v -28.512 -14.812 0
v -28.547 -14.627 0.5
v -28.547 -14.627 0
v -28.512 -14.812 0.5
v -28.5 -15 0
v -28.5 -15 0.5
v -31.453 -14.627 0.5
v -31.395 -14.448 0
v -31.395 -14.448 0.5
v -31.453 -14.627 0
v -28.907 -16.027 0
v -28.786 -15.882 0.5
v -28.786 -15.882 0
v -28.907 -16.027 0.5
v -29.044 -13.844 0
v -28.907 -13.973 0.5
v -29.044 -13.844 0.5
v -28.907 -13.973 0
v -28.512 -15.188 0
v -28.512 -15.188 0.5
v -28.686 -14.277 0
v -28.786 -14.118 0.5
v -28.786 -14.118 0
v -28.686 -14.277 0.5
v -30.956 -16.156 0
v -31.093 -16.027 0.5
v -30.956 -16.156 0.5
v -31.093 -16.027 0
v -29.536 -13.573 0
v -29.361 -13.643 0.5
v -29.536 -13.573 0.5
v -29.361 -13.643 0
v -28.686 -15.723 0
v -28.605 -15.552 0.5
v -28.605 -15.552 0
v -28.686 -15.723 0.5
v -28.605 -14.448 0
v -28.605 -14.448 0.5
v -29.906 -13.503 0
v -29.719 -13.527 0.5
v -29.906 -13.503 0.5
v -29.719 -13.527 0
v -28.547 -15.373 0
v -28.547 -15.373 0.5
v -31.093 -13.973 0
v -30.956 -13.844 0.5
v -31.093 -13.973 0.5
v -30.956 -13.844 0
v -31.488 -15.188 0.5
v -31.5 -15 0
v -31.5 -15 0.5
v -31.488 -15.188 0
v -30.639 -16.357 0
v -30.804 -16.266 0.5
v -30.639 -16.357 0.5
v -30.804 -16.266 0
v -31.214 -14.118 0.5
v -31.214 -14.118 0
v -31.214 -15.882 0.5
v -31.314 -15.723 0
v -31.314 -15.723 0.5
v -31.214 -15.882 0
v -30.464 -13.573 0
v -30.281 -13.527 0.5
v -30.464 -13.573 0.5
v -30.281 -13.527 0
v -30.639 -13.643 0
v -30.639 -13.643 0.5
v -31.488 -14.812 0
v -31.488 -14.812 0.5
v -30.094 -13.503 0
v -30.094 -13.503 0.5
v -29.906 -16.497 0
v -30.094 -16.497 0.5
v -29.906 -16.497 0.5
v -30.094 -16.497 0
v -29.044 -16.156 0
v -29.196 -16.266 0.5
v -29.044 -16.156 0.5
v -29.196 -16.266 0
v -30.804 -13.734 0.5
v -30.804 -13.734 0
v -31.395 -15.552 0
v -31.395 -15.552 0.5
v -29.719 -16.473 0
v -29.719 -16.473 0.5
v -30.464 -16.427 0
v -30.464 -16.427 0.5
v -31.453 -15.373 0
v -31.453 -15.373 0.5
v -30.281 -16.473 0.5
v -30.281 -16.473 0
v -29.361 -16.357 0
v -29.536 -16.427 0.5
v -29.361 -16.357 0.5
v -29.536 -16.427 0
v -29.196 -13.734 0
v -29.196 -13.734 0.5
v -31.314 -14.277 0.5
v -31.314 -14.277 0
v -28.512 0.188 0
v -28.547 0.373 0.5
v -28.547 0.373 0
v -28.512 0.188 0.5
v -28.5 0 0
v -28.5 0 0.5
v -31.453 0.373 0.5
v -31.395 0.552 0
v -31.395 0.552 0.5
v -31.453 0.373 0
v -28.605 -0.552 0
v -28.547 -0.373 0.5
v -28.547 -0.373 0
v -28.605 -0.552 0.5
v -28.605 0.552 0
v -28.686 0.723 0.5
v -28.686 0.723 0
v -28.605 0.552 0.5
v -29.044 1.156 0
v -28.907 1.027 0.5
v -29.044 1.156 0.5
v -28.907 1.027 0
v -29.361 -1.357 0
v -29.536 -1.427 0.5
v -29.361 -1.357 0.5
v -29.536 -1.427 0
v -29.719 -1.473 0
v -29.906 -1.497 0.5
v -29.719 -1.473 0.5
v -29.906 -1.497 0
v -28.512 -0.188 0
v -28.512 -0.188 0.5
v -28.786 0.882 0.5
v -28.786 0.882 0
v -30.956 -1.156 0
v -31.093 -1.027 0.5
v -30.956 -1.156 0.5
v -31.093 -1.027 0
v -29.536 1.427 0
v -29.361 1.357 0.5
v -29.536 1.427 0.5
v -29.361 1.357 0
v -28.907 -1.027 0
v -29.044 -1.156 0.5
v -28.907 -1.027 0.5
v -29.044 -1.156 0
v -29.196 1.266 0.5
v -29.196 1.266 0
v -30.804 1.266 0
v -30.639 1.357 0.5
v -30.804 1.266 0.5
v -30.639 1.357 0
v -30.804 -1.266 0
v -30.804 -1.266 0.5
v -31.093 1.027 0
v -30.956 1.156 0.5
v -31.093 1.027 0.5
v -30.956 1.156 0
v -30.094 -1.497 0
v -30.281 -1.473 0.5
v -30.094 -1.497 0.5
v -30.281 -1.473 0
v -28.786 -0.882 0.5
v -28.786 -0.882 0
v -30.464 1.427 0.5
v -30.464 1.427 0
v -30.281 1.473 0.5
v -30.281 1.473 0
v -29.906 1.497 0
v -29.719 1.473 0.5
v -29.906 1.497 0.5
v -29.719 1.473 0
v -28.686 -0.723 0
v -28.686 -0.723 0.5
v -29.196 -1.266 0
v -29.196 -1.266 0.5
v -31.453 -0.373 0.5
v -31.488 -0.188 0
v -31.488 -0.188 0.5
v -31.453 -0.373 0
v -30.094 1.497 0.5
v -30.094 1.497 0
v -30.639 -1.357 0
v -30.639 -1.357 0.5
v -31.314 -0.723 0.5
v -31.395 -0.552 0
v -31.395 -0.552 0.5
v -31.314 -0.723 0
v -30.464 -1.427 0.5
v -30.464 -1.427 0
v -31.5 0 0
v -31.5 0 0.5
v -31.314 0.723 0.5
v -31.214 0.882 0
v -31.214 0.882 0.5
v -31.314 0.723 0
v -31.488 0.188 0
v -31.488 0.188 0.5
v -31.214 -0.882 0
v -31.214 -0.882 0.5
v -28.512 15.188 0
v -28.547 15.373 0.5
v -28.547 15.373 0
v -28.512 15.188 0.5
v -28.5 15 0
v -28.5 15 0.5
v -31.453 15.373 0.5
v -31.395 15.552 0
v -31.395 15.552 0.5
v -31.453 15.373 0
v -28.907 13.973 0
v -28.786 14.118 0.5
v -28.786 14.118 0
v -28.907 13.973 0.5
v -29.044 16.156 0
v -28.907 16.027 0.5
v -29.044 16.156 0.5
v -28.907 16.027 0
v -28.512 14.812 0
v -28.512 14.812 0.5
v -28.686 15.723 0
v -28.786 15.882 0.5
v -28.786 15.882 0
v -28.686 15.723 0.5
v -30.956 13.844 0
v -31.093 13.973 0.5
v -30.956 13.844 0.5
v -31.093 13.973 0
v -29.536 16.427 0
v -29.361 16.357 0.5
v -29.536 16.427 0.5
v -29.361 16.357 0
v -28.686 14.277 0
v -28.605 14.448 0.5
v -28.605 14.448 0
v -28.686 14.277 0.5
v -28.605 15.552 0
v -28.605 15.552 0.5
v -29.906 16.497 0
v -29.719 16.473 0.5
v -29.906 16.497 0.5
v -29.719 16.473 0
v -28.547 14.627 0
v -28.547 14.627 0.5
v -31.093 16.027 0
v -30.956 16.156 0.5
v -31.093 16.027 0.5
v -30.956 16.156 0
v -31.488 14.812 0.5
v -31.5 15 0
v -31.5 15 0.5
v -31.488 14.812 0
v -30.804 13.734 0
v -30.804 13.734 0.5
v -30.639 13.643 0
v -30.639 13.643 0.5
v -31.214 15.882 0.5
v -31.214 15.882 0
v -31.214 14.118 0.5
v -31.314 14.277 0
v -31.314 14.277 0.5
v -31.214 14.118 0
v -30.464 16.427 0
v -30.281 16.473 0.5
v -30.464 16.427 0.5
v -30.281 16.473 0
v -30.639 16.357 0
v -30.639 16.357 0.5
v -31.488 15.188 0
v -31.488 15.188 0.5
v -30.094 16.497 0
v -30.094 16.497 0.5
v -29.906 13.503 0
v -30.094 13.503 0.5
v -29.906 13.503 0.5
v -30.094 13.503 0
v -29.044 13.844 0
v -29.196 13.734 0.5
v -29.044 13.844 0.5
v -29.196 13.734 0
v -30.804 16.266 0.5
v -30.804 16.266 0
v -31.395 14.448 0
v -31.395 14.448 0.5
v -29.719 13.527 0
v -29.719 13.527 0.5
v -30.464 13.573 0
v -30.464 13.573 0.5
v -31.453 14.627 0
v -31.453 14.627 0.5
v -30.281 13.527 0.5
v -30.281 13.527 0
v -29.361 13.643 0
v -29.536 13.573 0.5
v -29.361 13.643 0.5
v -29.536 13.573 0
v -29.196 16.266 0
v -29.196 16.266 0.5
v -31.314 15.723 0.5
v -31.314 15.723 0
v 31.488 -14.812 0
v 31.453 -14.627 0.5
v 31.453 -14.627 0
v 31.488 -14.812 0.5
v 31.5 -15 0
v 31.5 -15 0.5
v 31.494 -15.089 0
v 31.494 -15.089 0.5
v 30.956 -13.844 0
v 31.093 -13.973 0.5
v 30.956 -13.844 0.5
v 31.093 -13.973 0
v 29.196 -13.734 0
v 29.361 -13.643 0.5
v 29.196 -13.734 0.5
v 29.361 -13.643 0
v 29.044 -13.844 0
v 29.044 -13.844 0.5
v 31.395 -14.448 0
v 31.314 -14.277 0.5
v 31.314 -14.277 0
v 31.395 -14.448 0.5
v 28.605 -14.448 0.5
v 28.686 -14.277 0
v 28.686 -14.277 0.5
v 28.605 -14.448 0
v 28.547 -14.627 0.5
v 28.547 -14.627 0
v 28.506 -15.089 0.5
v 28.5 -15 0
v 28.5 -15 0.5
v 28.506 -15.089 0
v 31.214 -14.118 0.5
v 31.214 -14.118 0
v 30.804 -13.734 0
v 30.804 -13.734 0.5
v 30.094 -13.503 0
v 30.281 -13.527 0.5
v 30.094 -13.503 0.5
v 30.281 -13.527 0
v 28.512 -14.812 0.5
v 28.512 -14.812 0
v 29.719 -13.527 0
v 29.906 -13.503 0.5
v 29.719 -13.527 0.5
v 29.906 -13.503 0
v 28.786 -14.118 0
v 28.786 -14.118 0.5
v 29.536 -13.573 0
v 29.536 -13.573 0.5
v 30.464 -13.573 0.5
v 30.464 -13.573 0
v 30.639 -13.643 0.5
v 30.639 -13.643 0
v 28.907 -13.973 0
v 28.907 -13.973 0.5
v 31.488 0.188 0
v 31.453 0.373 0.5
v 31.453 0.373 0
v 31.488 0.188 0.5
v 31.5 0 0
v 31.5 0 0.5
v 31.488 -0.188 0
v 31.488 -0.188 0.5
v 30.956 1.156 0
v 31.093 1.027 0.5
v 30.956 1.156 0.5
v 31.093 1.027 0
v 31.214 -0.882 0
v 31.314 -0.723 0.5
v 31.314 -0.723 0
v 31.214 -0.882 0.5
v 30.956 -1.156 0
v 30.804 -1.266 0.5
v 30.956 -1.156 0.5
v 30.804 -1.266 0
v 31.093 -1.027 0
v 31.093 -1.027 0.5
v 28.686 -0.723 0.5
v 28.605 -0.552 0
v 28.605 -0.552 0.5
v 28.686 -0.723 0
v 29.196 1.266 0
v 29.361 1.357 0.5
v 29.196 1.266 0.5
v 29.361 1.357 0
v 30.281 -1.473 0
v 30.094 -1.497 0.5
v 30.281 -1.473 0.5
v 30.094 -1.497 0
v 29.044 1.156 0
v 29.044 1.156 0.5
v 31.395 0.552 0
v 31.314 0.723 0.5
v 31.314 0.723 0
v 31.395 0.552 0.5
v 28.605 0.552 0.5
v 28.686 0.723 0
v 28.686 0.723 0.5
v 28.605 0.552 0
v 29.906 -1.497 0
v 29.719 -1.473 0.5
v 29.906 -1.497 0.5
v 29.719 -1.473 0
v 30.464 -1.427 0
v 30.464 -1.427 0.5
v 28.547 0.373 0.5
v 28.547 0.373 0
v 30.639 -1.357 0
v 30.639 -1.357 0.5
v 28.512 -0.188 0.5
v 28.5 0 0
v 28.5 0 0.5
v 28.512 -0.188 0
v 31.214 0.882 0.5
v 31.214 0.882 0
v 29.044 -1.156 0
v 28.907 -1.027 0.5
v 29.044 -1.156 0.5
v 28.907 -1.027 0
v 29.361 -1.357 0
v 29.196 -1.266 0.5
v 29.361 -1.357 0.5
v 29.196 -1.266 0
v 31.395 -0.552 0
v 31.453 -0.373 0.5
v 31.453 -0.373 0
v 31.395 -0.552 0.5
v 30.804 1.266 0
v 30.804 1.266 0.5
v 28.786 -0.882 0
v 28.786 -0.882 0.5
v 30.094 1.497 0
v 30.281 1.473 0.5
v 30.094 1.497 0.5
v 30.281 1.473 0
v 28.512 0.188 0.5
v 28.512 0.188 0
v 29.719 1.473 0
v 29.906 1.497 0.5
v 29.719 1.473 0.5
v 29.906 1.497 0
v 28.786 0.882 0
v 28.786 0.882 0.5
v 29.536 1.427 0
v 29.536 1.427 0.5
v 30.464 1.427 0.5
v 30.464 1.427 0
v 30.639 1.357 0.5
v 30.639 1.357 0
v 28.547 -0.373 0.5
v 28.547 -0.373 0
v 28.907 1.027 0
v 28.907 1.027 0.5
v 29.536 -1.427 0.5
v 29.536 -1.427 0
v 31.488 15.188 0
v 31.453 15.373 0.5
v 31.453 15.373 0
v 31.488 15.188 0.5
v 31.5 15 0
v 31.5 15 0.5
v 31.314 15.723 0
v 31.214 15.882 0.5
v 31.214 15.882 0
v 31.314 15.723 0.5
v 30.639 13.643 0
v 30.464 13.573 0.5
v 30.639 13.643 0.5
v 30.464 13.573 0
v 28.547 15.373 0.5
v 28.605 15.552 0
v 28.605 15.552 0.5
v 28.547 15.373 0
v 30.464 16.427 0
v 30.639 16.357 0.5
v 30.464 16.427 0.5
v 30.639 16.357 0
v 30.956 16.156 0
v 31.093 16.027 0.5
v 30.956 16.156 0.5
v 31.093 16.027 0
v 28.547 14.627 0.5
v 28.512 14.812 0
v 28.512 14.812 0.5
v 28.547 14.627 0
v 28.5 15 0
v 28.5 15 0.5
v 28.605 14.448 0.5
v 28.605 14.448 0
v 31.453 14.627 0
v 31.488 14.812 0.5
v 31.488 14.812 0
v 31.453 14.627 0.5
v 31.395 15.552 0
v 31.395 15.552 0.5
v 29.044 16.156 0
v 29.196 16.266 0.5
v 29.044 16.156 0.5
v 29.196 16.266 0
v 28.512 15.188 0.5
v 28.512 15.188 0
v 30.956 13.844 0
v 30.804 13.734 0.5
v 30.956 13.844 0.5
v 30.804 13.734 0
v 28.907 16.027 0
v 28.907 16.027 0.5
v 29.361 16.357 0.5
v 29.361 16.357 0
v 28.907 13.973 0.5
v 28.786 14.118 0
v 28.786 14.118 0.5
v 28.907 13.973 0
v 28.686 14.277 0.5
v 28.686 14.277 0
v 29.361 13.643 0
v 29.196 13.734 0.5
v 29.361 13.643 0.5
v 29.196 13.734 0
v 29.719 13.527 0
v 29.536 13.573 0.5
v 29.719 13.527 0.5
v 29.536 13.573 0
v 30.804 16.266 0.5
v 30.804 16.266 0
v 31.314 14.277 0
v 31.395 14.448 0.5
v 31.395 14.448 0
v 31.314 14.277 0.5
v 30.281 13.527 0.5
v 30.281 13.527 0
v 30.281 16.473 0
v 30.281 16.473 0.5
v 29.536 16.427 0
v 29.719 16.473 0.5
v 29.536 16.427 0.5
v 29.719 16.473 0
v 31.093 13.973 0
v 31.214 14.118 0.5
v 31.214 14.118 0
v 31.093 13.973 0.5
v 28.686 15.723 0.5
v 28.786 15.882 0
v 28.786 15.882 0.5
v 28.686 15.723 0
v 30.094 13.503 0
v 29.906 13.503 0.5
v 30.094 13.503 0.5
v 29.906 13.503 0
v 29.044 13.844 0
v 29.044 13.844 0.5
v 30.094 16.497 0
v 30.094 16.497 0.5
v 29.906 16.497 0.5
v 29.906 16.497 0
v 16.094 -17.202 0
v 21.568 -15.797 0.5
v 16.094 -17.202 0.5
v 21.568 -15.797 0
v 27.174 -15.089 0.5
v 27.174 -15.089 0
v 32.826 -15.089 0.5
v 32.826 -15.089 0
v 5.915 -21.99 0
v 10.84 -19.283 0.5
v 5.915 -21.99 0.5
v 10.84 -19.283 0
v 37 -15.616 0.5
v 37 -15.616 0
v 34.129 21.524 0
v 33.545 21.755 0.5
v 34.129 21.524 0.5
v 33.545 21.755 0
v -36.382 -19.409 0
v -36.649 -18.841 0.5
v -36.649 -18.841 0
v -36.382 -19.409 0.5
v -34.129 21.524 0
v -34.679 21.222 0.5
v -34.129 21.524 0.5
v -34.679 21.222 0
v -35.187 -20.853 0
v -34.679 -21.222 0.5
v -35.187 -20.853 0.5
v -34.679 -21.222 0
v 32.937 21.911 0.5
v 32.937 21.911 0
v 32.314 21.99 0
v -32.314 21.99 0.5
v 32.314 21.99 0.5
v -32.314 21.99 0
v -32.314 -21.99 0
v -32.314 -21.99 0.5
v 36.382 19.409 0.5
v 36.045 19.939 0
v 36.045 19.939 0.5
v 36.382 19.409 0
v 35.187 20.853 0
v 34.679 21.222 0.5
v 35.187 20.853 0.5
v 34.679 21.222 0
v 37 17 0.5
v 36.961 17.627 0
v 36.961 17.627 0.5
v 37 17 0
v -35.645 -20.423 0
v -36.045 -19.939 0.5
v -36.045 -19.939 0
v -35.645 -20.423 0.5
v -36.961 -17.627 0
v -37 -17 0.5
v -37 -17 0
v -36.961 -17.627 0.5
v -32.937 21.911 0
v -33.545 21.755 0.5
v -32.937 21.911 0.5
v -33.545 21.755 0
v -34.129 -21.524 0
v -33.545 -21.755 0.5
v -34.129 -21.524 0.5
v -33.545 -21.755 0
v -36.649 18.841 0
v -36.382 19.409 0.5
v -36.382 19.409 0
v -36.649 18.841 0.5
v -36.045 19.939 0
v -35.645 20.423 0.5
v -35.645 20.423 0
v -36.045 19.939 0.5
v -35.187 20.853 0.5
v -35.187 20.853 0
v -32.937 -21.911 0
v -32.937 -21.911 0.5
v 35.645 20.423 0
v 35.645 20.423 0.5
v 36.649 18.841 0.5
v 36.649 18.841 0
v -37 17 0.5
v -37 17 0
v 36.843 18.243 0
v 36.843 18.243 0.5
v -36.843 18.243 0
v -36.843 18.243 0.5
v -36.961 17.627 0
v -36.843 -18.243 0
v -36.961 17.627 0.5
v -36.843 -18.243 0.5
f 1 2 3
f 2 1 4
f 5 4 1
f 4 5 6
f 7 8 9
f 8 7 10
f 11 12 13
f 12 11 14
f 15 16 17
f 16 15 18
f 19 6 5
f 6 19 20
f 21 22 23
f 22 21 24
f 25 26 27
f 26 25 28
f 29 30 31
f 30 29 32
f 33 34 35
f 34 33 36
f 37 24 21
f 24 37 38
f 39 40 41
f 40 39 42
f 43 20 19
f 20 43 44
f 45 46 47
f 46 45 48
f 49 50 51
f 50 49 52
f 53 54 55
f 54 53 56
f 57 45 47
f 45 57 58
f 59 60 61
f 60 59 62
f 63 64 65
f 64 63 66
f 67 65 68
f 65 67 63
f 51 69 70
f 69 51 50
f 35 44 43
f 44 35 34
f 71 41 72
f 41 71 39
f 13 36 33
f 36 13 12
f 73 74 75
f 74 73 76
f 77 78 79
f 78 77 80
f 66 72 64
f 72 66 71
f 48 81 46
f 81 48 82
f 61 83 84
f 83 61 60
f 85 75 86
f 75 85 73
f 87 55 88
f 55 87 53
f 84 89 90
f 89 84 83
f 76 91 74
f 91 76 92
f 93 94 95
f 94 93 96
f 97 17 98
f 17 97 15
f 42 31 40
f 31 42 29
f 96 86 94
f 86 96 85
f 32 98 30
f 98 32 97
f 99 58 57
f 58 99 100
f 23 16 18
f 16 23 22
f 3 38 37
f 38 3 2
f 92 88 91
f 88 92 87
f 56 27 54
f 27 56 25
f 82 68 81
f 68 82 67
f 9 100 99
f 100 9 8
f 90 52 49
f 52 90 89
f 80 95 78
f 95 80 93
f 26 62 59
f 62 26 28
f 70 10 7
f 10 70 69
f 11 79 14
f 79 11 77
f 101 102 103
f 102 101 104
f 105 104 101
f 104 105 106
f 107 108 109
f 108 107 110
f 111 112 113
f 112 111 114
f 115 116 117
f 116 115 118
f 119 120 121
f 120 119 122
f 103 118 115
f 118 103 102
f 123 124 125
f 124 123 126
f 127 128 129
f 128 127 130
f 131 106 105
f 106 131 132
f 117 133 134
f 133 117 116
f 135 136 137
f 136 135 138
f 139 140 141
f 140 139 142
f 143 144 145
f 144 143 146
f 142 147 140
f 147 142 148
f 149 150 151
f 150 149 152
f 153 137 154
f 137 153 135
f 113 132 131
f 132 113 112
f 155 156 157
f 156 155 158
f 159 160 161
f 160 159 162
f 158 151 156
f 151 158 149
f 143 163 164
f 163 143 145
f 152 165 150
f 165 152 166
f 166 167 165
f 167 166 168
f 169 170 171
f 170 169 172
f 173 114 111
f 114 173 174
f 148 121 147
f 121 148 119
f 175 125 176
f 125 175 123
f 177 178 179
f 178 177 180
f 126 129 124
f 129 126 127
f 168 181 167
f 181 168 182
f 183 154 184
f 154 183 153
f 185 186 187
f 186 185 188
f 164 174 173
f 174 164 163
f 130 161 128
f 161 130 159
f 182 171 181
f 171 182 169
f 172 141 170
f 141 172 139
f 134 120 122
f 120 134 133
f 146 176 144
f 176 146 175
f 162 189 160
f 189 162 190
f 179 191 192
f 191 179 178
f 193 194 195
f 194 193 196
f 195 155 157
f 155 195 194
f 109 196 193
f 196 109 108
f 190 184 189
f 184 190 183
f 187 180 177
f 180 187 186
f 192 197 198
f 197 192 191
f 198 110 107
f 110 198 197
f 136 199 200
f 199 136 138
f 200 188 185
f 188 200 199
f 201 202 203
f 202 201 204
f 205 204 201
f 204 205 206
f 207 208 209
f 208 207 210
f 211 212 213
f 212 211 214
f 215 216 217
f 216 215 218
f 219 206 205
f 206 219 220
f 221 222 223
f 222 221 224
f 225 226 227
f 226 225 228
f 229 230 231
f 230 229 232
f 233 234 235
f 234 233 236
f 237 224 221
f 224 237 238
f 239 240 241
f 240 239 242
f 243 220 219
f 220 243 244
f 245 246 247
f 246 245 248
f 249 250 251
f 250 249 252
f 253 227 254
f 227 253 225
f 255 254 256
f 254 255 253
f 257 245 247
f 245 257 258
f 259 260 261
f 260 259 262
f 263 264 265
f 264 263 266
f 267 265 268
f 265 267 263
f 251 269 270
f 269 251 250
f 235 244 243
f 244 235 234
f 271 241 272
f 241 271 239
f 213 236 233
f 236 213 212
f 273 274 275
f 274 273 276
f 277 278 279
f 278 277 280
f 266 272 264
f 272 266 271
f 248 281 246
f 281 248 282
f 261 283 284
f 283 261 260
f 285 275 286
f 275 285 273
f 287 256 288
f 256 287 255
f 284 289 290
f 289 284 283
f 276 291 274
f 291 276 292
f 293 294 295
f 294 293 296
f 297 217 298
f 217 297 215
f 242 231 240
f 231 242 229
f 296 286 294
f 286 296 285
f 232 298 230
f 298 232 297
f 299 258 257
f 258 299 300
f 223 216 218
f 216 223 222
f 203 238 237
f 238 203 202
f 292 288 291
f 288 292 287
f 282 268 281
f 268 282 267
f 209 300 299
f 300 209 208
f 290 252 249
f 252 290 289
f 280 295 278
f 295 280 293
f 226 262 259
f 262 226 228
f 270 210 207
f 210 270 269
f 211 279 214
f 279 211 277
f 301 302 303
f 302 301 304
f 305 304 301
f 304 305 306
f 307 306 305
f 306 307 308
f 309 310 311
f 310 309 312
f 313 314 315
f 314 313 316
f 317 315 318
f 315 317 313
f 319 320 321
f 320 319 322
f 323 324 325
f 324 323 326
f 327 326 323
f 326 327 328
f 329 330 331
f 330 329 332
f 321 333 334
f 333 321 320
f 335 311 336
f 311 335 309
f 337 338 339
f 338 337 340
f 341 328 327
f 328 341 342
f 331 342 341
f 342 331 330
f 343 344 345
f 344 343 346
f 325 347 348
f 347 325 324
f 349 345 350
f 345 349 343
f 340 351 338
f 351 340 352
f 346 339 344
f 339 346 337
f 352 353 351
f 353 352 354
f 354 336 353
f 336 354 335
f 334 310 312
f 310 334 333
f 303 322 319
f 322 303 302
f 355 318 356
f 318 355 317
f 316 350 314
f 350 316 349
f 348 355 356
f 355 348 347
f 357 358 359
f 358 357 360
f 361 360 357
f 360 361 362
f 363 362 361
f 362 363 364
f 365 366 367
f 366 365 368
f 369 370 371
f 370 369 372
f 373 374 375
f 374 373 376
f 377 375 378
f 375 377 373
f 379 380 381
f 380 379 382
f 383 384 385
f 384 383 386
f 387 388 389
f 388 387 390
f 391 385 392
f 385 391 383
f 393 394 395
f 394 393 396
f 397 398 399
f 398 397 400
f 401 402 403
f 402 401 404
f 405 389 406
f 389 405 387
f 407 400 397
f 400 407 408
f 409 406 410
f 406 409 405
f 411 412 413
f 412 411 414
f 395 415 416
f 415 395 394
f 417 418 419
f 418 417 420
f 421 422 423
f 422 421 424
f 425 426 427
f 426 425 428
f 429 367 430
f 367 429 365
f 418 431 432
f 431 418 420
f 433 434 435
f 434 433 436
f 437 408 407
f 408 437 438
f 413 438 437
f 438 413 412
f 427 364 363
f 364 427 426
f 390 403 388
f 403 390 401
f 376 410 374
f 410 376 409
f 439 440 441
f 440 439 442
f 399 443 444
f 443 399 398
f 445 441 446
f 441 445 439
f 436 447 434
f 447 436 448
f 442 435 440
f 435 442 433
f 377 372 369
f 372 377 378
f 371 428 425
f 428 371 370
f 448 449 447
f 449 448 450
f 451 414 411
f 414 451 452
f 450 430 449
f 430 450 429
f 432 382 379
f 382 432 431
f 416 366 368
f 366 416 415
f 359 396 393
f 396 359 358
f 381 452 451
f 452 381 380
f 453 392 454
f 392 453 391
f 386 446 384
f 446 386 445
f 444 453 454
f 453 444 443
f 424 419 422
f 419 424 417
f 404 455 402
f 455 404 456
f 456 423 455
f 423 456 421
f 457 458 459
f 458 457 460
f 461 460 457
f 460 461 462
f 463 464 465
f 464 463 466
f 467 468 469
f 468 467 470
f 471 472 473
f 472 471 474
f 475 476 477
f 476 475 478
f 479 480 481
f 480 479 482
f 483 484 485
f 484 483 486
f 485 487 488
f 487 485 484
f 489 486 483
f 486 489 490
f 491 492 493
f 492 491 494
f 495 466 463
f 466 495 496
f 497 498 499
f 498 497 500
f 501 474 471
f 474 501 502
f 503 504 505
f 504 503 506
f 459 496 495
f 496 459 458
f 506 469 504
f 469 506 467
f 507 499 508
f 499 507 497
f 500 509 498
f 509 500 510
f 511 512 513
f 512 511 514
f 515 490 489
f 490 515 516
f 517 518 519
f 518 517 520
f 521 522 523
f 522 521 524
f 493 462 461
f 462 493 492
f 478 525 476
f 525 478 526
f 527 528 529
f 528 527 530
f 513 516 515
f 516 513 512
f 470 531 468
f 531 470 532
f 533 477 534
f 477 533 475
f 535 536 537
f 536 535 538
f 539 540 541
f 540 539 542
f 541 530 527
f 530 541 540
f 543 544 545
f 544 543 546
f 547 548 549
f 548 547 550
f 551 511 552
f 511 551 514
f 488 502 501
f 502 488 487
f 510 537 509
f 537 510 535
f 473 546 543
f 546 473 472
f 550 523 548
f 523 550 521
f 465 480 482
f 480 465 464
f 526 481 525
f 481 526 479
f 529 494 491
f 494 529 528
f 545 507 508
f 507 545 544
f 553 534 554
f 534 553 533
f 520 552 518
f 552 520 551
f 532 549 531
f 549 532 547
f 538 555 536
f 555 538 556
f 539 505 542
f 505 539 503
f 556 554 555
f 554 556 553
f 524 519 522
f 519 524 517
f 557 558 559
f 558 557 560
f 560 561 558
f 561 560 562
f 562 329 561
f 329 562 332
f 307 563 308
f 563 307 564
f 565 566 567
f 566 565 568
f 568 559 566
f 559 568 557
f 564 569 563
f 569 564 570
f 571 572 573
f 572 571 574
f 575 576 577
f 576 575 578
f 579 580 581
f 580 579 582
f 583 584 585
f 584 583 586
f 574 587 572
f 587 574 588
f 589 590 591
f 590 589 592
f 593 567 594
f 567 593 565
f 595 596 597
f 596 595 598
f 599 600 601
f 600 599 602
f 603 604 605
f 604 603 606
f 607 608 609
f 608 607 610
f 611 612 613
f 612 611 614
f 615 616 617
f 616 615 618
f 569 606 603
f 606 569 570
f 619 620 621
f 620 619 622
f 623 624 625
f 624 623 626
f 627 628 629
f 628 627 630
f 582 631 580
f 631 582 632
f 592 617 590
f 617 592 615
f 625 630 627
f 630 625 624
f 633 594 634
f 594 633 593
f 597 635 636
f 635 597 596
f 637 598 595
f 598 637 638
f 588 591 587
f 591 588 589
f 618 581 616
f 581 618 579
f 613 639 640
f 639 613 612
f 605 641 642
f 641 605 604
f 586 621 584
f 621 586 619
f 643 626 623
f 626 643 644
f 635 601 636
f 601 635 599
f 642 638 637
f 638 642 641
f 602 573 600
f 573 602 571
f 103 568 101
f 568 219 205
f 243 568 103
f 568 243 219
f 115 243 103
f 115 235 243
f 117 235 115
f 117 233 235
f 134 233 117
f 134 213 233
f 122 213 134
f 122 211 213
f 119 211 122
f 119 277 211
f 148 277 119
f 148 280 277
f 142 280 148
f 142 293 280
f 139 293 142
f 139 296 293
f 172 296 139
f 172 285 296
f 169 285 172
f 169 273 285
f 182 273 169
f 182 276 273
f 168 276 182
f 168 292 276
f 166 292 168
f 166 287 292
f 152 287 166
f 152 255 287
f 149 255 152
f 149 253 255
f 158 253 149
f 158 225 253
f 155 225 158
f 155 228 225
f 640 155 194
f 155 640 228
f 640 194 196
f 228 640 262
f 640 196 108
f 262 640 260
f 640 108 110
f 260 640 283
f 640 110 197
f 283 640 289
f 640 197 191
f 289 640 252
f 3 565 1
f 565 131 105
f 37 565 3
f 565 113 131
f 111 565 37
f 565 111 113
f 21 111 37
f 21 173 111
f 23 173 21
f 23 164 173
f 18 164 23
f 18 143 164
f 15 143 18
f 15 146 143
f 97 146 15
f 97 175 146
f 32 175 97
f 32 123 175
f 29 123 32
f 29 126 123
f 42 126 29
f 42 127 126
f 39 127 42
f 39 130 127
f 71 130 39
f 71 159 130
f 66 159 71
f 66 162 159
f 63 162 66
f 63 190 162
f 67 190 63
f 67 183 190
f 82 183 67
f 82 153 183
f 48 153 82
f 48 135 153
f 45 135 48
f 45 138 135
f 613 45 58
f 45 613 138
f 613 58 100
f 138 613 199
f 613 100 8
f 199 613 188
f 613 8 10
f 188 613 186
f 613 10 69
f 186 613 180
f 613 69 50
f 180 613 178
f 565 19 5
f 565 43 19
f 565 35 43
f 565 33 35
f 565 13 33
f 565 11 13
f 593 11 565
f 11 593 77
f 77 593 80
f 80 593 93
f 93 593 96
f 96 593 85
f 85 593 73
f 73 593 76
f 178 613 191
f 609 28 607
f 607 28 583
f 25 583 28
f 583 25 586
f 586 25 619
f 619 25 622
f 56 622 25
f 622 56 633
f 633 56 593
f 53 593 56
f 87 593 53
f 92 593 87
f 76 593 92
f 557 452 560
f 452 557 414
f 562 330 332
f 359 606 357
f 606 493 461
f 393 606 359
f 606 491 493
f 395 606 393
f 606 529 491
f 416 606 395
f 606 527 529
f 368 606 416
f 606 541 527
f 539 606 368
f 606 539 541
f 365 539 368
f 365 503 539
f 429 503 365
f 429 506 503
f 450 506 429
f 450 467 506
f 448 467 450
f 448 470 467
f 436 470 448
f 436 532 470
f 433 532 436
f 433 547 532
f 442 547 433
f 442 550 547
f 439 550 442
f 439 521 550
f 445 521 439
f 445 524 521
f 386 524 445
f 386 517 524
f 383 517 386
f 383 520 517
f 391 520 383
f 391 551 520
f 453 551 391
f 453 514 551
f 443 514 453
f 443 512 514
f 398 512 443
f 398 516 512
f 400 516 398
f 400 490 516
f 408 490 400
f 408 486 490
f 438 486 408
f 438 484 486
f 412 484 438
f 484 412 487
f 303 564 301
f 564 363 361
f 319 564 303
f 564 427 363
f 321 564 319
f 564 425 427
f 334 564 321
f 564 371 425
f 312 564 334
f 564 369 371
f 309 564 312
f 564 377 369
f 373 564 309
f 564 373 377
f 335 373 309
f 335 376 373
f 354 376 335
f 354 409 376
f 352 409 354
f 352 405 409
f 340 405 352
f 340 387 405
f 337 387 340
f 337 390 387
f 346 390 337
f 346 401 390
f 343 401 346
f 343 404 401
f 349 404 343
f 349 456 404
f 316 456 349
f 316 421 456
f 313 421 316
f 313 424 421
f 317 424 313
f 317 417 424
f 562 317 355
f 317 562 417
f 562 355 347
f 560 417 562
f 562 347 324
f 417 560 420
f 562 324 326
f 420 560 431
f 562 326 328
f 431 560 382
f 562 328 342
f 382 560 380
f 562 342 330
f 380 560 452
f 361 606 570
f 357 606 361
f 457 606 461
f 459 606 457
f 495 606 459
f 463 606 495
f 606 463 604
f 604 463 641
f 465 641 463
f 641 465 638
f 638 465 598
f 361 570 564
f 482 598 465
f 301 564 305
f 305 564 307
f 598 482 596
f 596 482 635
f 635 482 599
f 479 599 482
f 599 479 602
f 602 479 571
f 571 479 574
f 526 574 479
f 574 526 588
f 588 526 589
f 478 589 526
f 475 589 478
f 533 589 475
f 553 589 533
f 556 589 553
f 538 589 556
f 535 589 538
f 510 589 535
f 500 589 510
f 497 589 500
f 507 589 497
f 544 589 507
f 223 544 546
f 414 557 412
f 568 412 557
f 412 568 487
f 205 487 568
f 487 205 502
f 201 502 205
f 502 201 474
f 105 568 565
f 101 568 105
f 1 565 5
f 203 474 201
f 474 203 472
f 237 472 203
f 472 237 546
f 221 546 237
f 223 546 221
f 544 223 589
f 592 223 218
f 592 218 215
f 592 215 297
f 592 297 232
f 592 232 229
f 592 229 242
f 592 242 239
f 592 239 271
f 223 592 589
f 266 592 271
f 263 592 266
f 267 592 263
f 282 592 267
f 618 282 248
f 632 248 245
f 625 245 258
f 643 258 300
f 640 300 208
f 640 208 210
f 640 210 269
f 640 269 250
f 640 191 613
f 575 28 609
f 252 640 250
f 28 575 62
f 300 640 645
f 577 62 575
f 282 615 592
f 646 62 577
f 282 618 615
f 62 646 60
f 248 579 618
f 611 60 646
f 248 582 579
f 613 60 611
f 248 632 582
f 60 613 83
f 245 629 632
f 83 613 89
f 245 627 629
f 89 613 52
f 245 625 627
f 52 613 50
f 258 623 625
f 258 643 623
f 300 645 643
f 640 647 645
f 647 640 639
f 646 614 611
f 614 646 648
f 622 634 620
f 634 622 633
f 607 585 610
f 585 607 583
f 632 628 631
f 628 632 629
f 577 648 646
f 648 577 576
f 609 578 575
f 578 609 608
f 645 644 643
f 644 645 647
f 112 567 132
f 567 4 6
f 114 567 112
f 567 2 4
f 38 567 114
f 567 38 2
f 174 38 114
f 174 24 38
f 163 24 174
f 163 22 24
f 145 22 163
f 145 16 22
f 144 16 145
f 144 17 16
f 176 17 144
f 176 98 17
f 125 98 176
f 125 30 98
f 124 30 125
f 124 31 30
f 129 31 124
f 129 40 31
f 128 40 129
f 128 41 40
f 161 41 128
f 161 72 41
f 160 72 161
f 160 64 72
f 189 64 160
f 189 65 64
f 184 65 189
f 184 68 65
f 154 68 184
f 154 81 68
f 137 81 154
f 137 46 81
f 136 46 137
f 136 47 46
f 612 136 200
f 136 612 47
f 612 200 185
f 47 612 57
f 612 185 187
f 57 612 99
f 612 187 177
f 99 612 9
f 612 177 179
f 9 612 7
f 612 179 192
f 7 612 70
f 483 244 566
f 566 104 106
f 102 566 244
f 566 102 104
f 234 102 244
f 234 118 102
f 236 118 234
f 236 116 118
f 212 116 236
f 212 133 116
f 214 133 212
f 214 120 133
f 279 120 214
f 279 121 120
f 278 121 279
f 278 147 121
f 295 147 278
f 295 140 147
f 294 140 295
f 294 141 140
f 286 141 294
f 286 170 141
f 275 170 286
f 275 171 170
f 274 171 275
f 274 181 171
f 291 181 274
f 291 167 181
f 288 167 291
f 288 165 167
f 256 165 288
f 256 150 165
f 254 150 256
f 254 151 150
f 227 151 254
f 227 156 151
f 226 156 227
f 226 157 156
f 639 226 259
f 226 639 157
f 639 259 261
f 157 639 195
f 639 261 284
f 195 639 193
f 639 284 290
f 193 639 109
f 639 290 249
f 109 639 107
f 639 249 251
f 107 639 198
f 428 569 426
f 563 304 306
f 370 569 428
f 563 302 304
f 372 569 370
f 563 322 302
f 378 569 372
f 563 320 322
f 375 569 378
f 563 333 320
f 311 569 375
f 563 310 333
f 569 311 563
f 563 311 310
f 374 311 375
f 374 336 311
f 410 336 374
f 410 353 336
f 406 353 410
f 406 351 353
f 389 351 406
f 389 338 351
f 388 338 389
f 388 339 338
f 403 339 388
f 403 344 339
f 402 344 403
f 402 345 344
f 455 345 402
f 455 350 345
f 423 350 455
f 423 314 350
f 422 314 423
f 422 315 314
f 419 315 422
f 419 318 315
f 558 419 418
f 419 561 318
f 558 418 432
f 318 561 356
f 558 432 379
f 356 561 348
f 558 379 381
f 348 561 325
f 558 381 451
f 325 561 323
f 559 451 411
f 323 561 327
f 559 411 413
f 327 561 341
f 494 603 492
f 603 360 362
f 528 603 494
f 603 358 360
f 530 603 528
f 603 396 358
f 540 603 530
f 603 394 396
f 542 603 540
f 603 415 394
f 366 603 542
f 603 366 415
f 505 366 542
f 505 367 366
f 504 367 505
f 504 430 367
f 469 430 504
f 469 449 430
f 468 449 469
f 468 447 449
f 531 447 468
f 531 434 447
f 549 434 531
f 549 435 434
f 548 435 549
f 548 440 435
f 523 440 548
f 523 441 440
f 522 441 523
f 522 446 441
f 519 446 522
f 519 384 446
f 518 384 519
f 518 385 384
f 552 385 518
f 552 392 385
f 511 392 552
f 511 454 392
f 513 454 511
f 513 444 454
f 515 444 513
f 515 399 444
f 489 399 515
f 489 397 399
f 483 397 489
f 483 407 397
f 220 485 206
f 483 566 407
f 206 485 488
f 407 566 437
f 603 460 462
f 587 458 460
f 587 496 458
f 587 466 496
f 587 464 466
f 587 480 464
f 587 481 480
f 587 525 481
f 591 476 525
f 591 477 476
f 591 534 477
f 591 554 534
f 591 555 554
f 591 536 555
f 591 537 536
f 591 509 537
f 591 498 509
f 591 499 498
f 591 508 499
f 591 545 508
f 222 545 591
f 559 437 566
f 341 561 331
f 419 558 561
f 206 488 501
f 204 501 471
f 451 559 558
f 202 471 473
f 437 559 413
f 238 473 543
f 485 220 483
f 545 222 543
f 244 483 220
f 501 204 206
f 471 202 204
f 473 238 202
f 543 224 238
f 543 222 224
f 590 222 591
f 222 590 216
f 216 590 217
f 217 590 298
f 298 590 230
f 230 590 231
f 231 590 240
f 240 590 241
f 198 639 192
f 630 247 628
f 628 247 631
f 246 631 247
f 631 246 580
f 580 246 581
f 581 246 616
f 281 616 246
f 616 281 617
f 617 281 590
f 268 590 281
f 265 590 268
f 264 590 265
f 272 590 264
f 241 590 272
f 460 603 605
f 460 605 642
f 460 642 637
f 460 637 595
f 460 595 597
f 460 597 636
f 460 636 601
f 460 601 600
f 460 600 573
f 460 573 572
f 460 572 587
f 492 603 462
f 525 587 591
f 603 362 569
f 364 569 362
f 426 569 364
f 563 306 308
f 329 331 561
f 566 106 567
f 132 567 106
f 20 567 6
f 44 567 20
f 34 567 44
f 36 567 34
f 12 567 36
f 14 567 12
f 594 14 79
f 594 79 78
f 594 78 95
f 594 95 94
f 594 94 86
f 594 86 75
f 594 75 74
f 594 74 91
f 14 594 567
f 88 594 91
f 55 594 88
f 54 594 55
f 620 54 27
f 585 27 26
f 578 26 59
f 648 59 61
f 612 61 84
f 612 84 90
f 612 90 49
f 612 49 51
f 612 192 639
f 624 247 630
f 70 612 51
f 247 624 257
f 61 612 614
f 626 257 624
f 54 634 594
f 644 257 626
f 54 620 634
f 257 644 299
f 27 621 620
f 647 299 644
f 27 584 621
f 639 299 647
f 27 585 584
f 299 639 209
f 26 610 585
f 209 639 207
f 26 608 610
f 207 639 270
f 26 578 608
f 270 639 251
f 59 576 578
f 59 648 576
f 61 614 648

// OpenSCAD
$fn = 50;


difference() {
	union() {
		translate(v = [0, 0, 0]) {
			rotate(a = [0, 0, 0]) {
				difference() {
					translate(v = [0, 0, 0]) {
						rotate(a = [0, 0, 0]) {
							linear_extrude(height = 8) {
								text(font = "DejaVu Sans Mono:style=Bold", halign = "center", size = 13, text = "", valign = "center");
							}
						}
					}
					translate(v = [0, 0, 0.5000000000]) {
						rotate(a = [0, 0, 0]) {
							linear_extrude(height = 7.5000000000) {
								offset(r = -0.5000000000) {
									text(font = "DejaVu Sans Mono:style=Bold", halign = "center", size = 13, text = "", valign = "center");
								}
							}
						}
					}
				}
			}
		}
		translate(v = [0, 0, 0]) {
			rotate(a = [0, 0, 0]) {
				hull() {
					translate(v = [-32.0000000000, 17.0000000000, 0]) {
						rotate(a = [0, 0, 0]) {
							translate(v = [0, 0, 0]) {
								rotate(a = [0, 0, 0]) {
									cylinder(h = 0.5000000000, r = 5);
								}
							}
						}
					}
					translate(v = [32.0000000000, 17.0000000000, 0]) {
						rotate(a = [0, 0, 0]) {
							translate(v = [0, 0, 0]) {
								rotate(a = [0, 0, 0]) {
									cylinder(h = 0.5000000000, r = 5);
								}
							}
						}
					}
					translate(v = [-32.0000000000, -17.0000000000, 0]) {
						rotate(a = [0, 0, 0]) {
							translate(v = [0, 0, 0]) {
								rotate(a = [0, 0, 0]) {
									cylinder(h = 0.5000000000, r = 5);
								}
							}
						}
					}
					translate(v = [32.0000000000, -17.0000000000, 0]) {
						rotate(a = [0, 0, 0]) {
							translate(v = [0, 0, 0]) {
								rotate(a = [0, 0, 0]) {
									cylinder(h = 0.5000000000, r = 5);
								}
							}
						}
					}
				}
			}
		}
	}
	union() {
		translate(v = [-30.0000000000, -15.0000000000, -125.0000000000]) {
			rotate(a = [0, 0, 0]) {
				cylinder(h = 250, r = 1.5000000000);
			}
		}
		translate(v = [-30.0000000000, 0.0000000000, -125.0000000000]) {
			rotate(a = [0, 0, 0]) {
				cylinder(h = 250, r = 1.5000000000);
			}
		}
		translate(v = [-30.0000000000, 15.0000000000, -125.0000000000]) {
			rotate(a = [0, 0, 0]) {
				cylinder(h = 250, r = 1.5000000000);
			}
		}
		translate(v = [30.0000000000, -15.0000000000, -125.0000000000]) {
			rotate(a = [0, 0, 0]) {
				cylinder(h = 250, r = 1.5000000000);
			}
		}
		translate(v = [30.0000000000, 0.0000000000, -125.0000000000]) {
			rotate(a = [0, 0, 0]) {
				cylinder(h = 250, r = 1.5000000000);
			}
		}
		translate(v = [30.0000000000, 15.0000000000, -125.0000000000]) {
			rotate(a = [0, 0, 0]) {
				cylinder(h = 250, r = 1.5000000000);
			}
		}
		translate(v = [30, -60, -5.0000000000]) {
			rotate(a = [0, 0, 0]) {
				cylinder(h = 10, r = 45);
			}
		}
	}
}
